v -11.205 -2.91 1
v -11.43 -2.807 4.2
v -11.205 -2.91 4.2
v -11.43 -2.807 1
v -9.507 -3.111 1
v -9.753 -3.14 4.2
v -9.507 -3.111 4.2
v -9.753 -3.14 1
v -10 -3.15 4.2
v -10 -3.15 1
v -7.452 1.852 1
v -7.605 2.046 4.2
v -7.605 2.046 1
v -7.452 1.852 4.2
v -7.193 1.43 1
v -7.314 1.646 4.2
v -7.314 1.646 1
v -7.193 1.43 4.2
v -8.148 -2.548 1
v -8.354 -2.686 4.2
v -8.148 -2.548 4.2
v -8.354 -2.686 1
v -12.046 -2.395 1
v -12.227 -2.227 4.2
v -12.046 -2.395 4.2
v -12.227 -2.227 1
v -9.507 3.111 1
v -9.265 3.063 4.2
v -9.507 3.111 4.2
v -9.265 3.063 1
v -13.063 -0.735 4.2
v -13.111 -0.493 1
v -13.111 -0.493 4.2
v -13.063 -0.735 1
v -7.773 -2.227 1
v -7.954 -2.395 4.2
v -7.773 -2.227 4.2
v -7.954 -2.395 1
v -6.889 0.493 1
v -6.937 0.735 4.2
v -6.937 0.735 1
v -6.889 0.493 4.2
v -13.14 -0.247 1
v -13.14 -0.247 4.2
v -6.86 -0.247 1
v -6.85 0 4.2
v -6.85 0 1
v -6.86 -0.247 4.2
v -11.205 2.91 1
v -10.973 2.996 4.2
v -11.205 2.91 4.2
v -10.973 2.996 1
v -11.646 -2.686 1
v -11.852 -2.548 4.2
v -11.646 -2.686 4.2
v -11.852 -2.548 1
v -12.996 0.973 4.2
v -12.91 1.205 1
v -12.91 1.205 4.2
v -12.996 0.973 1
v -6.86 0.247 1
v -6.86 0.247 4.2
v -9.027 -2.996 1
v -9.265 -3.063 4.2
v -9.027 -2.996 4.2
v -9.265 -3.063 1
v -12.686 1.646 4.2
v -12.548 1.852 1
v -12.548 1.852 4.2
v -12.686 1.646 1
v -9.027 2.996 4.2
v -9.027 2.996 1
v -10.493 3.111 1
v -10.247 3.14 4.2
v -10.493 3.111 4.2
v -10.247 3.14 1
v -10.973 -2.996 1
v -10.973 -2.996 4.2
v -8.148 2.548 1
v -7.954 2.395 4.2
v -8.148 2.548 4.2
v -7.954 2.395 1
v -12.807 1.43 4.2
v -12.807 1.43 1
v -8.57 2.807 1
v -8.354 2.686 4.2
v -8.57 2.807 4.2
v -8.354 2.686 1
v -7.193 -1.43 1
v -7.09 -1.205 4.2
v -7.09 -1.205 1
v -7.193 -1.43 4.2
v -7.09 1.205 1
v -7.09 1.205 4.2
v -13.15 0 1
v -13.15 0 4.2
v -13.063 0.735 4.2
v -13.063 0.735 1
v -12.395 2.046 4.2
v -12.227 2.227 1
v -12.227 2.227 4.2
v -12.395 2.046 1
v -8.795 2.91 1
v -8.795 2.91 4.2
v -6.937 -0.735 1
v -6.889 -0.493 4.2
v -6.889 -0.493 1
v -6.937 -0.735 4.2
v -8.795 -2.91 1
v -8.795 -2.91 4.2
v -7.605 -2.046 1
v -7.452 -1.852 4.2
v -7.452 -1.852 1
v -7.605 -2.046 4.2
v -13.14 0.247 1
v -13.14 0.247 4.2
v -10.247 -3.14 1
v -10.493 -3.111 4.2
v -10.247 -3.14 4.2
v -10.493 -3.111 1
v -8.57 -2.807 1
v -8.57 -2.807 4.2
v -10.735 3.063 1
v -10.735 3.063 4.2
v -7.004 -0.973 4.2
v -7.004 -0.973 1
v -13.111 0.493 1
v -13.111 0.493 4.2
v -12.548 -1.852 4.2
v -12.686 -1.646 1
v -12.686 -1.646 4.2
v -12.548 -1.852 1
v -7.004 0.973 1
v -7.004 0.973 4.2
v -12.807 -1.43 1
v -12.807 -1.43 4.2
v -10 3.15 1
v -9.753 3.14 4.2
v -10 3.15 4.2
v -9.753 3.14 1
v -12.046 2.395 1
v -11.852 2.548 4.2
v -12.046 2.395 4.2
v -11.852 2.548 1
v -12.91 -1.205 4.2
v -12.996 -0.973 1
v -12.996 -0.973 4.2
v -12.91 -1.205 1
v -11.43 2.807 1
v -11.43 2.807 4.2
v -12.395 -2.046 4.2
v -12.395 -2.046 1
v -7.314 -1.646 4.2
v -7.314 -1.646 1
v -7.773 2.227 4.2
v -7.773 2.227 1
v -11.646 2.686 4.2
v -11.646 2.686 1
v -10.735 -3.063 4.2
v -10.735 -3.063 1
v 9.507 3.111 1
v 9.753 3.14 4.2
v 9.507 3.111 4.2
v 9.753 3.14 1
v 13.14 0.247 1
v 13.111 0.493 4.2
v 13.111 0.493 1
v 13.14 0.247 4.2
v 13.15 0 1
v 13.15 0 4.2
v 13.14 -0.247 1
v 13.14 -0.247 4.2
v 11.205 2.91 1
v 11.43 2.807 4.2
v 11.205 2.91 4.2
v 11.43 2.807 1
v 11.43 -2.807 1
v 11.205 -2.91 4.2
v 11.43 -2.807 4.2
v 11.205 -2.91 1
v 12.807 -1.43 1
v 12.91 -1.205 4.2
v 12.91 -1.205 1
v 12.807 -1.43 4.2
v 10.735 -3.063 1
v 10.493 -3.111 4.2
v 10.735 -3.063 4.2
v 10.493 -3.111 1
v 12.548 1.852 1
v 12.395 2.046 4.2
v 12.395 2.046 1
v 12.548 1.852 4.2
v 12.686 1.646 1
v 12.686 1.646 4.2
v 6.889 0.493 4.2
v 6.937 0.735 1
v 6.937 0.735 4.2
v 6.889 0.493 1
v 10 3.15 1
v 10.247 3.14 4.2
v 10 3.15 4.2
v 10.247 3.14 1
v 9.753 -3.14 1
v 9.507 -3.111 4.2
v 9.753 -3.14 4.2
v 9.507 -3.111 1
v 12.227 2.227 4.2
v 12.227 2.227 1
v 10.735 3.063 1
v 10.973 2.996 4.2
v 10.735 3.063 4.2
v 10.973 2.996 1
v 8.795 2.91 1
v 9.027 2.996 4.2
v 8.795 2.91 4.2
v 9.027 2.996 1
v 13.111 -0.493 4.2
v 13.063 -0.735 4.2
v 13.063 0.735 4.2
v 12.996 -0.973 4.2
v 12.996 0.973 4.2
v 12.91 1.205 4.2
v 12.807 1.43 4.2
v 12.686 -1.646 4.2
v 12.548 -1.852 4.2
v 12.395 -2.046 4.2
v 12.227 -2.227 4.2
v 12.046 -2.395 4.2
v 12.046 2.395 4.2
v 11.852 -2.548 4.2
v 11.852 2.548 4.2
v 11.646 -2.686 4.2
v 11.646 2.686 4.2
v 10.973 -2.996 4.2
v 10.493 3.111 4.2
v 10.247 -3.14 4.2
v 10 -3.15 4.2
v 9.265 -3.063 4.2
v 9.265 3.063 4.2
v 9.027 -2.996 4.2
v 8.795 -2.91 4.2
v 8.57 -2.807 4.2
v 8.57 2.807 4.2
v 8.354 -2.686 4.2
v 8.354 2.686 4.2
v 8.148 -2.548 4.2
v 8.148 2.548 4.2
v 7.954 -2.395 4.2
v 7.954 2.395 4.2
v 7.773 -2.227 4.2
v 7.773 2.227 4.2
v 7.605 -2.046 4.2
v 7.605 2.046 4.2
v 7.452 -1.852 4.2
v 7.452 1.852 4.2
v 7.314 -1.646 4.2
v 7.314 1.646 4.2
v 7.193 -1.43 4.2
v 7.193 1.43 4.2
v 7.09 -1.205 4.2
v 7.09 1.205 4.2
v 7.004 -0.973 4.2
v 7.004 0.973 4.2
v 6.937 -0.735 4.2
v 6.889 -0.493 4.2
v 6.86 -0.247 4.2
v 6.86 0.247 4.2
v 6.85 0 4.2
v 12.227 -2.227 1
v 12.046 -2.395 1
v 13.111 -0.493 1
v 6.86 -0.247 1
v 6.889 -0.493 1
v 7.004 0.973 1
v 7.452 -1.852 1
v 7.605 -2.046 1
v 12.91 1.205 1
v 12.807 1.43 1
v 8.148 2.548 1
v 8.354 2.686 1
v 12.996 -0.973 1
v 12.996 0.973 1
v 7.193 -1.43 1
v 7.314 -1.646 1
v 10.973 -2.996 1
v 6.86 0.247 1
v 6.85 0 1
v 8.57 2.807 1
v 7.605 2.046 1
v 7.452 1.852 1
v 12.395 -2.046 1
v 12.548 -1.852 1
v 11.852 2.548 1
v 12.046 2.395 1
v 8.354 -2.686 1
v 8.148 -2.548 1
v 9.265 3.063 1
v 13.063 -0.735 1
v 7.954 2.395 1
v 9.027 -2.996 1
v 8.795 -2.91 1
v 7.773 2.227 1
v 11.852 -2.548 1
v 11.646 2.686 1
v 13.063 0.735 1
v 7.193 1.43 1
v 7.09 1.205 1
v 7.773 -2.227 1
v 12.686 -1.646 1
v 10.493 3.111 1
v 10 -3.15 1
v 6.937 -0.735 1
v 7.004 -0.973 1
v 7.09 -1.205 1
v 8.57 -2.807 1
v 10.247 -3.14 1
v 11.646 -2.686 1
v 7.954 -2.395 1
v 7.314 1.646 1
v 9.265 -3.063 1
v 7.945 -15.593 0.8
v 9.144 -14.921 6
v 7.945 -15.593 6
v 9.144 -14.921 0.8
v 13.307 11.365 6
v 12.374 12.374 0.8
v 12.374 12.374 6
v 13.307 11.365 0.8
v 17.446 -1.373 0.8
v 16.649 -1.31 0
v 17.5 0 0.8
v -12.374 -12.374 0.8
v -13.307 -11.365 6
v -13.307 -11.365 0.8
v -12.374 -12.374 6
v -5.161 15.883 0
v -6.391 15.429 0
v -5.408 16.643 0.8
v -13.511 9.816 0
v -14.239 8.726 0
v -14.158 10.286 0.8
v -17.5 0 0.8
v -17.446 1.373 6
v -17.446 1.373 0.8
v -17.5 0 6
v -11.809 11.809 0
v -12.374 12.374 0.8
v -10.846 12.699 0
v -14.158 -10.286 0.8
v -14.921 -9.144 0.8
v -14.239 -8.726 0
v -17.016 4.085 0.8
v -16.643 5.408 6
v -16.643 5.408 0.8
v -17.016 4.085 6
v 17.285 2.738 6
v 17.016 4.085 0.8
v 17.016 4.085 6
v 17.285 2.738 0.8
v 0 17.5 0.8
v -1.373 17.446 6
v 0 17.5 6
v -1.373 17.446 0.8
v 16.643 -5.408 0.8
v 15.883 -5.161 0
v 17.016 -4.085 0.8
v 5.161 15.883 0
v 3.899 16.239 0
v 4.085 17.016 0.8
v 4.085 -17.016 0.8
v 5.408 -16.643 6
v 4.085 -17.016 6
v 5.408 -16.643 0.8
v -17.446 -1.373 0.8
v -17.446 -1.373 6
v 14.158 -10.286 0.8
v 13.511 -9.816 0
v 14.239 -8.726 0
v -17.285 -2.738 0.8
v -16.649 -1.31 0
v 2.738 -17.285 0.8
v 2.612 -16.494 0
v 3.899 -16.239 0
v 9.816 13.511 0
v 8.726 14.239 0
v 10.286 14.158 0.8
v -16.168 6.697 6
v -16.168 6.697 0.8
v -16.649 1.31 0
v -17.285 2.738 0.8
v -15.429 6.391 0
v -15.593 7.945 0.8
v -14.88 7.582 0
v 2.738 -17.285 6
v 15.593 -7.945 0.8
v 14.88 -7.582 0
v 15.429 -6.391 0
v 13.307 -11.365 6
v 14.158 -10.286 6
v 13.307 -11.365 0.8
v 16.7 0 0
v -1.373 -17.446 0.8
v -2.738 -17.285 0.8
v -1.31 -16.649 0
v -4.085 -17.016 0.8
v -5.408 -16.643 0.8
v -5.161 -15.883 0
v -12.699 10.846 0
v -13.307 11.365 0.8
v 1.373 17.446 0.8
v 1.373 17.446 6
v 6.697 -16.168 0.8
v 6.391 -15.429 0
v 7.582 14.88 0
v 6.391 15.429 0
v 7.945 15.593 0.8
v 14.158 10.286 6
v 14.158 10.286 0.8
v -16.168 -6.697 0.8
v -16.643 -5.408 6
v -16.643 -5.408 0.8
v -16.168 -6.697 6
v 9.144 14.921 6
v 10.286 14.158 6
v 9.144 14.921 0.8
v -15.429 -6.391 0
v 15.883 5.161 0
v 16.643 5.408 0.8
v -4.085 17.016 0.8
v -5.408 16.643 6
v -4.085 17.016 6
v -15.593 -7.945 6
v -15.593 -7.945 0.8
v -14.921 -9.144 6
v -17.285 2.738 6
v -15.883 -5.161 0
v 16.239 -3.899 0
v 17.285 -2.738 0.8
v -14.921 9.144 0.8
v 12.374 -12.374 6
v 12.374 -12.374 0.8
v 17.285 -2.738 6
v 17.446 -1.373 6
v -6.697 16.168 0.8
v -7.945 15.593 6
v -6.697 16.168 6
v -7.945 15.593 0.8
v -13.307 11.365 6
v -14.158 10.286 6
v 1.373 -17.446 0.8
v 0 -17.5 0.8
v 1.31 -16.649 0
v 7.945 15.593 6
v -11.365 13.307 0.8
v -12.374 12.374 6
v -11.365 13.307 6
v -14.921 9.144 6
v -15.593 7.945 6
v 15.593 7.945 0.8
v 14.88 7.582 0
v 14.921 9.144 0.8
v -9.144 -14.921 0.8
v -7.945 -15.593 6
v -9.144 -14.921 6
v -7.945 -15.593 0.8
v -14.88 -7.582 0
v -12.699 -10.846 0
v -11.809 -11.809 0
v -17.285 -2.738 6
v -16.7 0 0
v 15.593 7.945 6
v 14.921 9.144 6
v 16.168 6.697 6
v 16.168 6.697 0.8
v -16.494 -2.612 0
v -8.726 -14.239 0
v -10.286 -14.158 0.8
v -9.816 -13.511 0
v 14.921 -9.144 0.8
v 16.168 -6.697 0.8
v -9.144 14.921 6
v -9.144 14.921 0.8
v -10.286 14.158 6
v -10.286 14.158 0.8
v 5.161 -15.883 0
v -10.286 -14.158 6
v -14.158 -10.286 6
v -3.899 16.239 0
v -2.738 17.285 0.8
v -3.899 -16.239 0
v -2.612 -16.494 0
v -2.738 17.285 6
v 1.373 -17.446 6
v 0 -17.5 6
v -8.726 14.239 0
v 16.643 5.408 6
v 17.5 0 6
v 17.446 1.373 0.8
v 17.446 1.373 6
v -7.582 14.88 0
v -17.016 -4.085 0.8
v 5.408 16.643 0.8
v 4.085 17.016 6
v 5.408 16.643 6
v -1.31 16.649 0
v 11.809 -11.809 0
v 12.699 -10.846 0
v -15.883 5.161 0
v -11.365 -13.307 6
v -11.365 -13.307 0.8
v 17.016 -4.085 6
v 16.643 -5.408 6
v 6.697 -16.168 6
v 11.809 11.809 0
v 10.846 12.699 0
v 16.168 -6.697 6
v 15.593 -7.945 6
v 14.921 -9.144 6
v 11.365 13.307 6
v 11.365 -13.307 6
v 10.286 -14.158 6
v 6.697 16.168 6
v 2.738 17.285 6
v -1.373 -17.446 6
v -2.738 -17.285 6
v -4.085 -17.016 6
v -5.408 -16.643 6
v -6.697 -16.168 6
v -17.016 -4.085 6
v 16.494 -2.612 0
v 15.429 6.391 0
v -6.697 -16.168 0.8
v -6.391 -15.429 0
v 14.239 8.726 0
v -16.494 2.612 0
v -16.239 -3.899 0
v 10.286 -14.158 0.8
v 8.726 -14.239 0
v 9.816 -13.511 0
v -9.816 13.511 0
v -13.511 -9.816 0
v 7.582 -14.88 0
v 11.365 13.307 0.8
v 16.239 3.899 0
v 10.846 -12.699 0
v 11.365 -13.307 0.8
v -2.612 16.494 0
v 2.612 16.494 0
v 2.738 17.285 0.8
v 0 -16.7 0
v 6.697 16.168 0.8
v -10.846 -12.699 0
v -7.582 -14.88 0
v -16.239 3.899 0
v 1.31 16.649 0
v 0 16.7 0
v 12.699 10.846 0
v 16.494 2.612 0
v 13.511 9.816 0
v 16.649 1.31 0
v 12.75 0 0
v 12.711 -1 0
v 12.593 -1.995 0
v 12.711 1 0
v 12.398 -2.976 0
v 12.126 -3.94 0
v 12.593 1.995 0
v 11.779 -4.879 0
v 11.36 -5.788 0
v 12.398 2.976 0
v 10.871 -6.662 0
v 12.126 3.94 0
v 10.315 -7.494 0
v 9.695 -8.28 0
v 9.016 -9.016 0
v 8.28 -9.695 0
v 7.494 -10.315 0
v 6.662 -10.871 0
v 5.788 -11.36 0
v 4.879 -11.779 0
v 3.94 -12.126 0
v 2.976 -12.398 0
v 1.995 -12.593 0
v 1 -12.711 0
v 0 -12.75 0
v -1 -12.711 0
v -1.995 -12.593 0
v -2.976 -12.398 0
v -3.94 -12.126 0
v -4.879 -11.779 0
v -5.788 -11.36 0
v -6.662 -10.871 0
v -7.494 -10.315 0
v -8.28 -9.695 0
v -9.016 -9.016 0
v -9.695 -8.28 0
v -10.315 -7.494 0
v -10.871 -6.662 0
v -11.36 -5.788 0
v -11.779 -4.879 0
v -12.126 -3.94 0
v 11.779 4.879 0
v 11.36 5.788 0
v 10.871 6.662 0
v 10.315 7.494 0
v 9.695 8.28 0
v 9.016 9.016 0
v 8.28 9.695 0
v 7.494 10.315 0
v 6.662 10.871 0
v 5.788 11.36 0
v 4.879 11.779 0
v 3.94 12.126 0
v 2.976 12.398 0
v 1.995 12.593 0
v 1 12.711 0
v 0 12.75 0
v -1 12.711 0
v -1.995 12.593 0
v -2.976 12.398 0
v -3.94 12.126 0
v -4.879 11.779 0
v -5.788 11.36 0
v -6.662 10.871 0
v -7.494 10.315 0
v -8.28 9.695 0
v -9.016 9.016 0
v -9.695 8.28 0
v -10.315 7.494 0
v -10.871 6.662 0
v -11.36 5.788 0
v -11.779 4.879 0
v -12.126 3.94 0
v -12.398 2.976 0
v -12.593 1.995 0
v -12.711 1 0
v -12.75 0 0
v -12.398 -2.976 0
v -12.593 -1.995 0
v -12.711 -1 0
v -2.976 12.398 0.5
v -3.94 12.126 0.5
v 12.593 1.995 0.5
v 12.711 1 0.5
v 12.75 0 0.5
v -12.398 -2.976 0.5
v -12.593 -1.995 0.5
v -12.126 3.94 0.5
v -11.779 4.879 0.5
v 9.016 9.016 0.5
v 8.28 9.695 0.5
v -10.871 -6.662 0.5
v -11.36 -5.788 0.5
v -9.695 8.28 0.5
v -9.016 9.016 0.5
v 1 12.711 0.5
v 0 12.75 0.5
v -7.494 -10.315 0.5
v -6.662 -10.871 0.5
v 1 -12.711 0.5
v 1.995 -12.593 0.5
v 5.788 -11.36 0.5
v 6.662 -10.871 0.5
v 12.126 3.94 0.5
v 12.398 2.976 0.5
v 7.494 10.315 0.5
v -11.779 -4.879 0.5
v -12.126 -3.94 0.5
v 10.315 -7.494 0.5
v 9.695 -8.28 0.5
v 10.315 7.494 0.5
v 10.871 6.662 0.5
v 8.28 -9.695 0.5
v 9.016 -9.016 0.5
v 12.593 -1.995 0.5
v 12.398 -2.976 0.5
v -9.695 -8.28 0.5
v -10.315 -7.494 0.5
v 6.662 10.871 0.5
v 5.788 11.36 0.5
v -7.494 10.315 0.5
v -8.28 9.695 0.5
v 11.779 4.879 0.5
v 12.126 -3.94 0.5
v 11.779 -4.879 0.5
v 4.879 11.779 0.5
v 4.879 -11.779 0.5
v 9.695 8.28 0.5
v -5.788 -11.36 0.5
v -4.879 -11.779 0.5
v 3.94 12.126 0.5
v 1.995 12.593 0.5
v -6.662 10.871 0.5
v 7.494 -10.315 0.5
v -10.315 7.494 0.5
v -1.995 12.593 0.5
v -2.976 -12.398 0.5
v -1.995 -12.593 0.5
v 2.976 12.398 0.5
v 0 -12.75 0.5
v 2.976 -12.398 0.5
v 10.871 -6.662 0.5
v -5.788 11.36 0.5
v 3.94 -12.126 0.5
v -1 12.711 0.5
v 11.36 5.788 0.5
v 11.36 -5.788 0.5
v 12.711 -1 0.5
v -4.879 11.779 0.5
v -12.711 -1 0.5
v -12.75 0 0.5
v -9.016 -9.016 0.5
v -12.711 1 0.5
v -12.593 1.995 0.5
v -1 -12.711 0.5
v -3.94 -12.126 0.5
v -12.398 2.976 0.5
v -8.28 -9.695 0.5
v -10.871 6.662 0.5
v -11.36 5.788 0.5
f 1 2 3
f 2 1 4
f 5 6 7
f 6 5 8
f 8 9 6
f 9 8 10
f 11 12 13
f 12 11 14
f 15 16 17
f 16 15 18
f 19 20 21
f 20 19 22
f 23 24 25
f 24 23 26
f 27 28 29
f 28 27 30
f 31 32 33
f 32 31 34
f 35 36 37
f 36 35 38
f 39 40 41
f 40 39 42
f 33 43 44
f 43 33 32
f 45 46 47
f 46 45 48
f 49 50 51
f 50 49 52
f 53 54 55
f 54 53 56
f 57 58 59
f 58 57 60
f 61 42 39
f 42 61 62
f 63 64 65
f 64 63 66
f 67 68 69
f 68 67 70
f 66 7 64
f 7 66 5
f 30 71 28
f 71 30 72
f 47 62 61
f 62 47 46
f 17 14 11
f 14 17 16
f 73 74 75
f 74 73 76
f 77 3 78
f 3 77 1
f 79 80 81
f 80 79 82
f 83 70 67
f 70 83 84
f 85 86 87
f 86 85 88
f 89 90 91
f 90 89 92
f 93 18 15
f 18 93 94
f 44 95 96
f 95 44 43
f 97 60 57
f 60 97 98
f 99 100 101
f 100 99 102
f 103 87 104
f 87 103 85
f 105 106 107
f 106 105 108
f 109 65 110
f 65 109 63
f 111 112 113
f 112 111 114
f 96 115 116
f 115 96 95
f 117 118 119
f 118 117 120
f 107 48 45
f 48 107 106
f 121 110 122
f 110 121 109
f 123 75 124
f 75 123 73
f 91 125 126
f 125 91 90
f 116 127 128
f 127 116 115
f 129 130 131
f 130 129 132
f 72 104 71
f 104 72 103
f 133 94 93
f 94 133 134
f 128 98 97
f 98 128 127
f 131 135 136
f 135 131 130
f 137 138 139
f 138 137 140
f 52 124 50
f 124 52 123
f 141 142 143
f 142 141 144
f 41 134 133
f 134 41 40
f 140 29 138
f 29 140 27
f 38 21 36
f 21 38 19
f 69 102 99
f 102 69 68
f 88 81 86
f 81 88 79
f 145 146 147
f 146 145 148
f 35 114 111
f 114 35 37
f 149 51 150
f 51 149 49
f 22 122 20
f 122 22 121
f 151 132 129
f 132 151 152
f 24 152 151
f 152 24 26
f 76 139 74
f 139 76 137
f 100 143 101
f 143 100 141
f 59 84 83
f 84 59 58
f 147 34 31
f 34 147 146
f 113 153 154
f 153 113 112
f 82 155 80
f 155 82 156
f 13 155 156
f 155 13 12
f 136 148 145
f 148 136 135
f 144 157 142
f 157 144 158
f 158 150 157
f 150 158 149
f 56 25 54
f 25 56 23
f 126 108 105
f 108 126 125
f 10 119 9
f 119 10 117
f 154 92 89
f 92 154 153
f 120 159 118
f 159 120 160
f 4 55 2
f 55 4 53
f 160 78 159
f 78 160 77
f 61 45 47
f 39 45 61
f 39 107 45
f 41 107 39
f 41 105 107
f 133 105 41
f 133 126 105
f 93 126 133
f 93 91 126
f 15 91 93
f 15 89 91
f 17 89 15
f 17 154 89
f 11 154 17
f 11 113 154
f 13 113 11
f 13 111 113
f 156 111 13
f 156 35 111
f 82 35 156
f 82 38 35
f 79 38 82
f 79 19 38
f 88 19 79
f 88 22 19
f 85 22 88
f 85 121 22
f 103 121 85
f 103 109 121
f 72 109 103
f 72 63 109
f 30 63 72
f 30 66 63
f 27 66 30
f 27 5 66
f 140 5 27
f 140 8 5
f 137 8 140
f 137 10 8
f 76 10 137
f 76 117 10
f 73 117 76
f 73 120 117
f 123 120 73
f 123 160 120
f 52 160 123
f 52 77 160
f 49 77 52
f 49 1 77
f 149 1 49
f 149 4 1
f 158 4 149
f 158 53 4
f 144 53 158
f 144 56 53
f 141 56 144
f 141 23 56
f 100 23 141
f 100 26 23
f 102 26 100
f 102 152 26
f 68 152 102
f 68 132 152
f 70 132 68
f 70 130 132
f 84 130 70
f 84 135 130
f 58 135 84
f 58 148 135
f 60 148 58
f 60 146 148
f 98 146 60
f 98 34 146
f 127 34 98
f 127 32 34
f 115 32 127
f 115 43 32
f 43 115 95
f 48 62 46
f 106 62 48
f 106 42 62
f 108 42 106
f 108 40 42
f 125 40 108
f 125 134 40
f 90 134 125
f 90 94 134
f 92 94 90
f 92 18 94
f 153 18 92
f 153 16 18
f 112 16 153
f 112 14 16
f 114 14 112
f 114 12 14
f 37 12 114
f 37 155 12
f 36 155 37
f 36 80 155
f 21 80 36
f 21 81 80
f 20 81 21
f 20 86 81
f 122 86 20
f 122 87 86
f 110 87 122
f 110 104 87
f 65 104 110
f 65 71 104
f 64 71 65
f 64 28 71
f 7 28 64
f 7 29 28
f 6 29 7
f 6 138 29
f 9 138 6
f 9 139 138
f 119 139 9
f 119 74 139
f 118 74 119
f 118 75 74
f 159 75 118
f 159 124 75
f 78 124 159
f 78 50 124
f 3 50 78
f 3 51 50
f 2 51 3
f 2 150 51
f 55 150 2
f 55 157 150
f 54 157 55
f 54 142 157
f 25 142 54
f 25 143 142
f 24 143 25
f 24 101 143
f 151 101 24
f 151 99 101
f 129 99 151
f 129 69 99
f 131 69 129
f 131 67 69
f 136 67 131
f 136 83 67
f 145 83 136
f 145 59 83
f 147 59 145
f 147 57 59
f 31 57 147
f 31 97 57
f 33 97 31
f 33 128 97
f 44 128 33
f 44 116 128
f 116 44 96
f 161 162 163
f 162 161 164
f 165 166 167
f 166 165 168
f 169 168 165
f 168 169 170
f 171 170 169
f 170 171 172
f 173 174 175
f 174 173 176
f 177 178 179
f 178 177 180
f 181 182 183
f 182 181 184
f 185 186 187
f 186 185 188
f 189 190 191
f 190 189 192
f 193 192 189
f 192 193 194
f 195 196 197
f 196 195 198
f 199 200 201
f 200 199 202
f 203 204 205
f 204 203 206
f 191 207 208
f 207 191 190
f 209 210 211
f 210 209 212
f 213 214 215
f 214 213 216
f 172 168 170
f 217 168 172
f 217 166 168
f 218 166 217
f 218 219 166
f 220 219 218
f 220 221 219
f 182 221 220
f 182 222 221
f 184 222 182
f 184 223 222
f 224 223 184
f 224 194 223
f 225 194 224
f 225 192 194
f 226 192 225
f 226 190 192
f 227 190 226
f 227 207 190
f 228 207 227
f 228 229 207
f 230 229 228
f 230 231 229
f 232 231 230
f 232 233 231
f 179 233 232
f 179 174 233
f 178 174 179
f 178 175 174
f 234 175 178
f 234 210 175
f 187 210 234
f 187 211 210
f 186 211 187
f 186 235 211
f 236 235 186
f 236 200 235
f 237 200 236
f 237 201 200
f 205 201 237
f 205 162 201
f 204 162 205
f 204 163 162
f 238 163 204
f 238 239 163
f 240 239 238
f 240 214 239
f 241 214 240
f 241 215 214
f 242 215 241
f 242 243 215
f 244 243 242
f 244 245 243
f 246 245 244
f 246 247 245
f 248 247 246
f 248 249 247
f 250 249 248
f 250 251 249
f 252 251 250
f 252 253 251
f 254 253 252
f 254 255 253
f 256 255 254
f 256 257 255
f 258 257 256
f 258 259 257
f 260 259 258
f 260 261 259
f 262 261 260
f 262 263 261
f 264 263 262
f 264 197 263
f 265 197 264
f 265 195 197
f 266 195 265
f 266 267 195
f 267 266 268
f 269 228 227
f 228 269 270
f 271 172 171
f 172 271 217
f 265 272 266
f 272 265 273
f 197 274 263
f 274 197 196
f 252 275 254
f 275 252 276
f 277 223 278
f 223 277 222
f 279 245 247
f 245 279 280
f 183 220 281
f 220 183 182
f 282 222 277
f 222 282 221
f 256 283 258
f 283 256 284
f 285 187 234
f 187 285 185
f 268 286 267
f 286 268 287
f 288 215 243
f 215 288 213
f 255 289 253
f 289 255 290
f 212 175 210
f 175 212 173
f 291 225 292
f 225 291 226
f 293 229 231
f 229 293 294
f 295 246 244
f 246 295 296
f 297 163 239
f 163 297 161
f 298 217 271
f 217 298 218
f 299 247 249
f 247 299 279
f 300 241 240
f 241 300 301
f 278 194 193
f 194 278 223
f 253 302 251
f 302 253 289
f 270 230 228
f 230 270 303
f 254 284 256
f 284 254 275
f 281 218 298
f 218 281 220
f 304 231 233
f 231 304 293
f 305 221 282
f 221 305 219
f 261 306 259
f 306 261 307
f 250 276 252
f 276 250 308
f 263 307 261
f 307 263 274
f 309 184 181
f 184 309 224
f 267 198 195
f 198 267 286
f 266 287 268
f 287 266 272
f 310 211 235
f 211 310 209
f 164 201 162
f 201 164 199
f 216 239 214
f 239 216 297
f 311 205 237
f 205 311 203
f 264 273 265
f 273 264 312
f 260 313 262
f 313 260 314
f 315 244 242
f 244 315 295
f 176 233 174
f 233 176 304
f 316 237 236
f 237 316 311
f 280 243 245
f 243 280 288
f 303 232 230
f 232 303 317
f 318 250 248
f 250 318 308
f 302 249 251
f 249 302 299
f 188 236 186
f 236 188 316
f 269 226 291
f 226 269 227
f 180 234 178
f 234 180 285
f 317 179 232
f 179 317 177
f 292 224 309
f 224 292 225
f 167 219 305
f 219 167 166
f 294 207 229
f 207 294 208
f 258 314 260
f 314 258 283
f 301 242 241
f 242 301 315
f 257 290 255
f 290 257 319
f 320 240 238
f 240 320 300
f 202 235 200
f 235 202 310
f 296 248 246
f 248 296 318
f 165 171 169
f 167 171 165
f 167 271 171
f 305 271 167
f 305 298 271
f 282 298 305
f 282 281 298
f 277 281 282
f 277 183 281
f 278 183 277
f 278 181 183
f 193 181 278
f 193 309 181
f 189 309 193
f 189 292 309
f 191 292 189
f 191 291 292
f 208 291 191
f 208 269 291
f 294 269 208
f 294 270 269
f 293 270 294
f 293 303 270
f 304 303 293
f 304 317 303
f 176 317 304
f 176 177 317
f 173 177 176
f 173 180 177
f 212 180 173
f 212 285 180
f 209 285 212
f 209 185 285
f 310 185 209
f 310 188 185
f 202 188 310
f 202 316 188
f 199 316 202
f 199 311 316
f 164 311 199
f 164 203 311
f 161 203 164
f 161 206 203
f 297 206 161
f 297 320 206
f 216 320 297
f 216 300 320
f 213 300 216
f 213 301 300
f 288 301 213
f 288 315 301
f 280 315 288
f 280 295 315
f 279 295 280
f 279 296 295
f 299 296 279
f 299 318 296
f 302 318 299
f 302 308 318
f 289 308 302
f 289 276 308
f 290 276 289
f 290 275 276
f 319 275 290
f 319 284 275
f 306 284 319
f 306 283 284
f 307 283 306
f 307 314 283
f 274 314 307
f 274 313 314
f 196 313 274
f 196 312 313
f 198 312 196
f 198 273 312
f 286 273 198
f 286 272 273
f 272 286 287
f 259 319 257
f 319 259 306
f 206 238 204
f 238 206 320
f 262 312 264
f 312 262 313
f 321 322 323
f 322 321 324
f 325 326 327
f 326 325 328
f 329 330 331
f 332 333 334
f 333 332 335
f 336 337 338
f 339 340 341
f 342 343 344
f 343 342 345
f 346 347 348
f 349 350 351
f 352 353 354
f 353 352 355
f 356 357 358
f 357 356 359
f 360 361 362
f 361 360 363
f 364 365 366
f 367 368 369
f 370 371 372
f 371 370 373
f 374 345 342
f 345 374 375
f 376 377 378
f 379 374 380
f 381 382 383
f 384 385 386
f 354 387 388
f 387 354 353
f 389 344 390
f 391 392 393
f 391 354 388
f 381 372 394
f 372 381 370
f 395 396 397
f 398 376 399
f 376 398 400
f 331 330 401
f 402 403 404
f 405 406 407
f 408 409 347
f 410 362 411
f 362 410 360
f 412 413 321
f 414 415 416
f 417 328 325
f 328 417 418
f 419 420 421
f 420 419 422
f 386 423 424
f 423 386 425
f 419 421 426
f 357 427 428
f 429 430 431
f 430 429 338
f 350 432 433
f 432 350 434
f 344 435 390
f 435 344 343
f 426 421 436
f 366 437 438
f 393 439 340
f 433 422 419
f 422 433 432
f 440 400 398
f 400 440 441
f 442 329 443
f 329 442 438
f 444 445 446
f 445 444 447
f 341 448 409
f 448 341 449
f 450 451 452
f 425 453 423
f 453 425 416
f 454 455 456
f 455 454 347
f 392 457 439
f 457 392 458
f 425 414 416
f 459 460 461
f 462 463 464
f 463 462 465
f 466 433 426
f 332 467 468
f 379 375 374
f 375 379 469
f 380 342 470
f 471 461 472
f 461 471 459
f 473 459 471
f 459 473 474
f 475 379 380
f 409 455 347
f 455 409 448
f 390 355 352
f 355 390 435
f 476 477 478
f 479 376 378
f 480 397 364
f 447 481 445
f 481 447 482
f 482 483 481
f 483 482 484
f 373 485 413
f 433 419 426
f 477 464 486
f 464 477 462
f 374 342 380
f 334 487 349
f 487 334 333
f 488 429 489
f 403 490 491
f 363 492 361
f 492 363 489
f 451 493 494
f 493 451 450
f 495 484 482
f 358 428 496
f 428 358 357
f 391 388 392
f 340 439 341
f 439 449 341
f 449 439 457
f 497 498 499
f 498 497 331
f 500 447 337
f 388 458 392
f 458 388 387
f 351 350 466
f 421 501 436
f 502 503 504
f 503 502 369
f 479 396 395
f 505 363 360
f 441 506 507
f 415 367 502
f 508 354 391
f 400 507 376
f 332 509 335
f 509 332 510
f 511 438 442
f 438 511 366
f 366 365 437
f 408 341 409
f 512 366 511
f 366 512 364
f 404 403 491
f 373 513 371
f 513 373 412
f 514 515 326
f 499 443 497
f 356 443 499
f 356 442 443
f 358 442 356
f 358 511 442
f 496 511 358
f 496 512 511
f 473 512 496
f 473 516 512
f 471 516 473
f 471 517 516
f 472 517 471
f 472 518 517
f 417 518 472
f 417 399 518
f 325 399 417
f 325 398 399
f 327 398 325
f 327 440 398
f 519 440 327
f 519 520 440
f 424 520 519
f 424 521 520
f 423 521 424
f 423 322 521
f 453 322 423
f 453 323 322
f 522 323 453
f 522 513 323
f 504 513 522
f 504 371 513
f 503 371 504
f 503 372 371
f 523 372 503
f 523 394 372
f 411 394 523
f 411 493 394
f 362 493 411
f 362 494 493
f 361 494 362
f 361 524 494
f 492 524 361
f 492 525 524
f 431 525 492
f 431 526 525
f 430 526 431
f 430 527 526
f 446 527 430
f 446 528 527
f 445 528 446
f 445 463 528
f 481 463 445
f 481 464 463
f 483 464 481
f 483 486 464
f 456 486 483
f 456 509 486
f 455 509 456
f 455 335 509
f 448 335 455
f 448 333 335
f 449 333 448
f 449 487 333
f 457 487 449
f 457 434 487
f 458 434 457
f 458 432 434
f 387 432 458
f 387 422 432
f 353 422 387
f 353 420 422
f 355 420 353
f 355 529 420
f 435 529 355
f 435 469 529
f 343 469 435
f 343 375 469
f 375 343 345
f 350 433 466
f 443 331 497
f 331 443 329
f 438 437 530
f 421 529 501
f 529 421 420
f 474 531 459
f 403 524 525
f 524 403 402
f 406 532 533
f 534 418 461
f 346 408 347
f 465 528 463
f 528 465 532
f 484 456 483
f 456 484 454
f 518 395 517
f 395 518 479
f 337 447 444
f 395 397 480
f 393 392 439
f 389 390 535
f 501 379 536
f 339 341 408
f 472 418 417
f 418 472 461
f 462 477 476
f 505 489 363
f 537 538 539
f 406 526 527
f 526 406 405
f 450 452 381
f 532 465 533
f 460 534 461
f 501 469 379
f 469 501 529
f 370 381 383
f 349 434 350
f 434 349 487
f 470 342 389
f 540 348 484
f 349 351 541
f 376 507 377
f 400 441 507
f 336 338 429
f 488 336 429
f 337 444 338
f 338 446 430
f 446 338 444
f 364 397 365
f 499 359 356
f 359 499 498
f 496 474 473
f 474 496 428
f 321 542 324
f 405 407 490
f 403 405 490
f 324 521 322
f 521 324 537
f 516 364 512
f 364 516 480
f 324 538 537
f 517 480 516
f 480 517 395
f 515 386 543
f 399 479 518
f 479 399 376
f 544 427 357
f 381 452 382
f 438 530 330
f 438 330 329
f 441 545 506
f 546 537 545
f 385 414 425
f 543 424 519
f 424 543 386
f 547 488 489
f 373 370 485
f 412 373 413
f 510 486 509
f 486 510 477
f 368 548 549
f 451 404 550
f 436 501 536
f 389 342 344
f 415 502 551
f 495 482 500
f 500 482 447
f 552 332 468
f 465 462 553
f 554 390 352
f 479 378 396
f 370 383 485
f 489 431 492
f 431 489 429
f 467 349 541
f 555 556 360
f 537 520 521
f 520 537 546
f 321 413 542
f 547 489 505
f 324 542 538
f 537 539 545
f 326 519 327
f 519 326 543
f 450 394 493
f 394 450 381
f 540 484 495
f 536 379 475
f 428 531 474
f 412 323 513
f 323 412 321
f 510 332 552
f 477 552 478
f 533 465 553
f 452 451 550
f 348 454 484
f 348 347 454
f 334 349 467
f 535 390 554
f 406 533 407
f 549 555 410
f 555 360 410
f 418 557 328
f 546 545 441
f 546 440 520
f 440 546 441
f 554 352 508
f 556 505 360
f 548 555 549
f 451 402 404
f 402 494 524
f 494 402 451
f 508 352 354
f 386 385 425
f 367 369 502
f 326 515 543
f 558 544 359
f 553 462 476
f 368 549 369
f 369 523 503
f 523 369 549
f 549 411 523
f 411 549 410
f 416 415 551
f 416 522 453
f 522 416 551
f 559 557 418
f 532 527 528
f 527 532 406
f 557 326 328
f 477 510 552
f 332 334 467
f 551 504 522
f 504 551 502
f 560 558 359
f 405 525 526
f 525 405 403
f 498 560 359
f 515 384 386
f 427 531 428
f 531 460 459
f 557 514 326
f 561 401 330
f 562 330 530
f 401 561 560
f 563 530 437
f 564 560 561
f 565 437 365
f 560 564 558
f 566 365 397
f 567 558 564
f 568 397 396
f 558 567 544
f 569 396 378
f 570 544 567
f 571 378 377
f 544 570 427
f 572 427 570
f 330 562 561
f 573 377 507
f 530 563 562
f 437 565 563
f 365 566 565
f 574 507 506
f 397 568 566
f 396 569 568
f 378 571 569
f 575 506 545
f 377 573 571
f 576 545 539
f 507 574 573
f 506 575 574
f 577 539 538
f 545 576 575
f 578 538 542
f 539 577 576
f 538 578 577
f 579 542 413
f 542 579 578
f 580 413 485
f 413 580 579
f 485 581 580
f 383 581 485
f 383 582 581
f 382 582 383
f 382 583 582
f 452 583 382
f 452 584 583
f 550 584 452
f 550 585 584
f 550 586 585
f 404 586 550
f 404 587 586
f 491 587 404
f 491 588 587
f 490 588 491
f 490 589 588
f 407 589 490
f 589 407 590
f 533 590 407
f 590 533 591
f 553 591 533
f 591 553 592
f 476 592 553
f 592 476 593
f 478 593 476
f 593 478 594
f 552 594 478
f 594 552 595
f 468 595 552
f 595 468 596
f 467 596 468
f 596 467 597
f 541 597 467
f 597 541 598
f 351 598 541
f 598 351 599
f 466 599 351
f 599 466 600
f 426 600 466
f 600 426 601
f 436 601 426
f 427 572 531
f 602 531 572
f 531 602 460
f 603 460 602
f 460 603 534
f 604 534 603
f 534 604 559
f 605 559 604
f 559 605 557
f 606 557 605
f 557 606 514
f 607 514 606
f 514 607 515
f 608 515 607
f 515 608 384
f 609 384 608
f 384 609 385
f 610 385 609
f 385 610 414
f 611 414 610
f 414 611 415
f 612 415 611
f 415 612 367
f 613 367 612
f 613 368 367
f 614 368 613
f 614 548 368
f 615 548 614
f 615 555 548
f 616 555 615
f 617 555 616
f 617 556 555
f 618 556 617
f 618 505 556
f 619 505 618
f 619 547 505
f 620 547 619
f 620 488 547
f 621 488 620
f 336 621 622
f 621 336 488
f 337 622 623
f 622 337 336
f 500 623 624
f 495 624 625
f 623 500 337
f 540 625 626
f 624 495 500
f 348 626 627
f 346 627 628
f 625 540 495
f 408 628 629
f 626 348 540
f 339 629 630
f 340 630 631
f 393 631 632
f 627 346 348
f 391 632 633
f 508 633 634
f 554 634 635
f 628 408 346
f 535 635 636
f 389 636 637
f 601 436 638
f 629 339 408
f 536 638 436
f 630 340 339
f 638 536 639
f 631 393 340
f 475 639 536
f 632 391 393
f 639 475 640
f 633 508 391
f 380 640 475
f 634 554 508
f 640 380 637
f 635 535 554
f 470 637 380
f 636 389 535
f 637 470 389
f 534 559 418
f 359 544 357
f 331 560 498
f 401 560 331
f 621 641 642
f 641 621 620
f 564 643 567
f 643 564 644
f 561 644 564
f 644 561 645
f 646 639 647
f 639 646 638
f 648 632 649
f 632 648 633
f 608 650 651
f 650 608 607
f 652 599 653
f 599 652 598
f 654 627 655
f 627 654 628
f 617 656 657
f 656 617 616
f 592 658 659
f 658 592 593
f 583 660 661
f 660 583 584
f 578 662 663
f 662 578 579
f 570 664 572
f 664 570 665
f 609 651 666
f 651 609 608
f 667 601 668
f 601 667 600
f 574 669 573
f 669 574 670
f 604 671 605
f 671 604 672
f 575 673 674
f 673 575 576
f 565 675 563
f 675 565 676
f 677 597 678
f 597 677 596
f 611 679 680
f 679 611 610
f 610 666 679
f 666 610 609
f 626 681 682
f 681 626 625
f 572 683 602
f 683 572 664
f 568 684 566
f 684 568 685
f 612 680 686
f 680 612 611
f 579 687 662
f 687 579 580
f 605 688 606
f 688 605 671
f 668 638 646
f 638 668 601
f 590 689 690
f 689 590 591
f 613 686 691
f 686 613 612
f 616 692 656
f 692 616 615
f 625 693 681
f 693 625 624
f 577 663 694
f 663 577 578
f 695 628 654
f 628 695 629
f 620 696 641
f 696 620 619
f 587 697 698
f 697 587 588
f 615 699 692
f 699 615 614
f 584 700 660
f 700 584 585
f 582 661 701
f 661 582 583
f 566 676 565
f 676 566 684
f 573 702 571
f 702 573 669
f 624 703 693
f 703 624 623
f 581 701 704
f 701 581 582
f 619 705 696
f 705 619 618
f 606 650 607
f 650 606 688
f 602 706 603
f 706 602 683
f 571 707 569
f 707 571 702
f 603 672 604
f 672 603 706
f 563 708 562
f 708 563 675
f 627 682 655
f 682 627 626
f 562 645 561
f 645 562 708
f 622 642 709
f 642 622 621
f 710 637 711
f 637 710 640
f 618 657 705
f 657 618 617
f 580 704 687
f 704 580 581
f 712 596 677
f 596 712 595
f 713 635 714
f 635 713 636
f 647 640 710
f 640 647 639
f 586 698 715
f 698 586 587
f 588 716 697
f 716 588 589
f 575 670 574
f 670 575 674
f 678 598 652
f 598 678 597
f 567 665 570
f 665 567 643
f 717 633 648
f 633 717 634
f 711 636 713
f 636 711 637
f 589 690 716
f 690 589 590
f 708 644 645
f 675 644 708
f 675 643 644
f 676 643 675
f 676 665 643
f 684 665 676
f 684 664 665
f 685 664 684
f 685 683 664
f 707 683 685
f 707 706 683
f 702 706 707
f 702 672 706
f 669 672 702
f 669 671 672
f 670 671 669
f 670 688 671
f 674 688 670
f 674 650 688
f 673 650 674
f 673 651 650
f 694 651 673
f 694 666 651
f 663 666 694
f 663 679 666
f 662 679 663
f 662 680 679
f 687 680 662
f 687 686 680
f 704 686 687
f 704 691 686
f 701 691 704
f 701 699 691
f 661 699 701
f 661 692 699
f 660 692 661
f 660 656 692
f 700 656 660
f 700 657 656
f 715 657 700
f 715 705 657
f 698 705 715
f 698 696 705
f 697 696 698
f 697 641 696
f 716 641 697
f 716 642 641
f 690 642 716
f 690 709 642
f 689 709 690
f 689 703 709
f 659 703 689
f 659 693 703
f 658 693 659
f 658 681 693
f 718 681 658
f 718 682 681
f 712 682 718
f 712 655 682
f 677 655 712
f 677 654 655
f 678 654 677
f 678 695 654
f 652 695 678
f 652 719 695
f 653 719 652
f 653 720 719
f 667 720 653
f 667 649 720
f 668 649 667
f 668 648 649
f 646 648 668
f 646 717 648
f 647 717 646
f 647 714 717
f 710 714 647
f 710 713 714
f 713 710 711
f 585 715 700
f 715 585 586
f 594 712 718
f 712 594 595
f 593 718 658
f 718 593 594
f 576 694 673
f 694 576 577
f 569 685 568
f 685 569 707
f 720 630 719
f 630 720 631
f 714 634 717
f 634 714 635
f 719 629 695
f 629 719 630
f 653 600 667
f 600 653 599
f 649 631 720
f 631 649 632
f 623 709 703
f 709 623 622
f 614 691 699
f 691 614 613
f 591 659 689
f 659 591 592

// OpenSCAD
// file: ../common-params.scad
// common-params.scad — Shared dimensions for BabyBox enclosure + figurines
// All values in millimeters

// === Neodymium Magnets (6x3mm disc) ===
magnet_dia       = 6;      // nominal diameter
magnet_h         = 3;      // nominal height
magnet_pocket_dia = 6.3;   // pocket diameter (0.3mm clearance for drop-in)
magnet_pocket_h  = 3.2;    // cavity height (0.2mm extra so magnet sits below rim)
magnet_spacing   = 20;     // center-to-center distance between the two magnets
magnet_seal_h    = 1.0;    // solid wall thickness enclosing magnets on each side
                            // (pause print, insert magnets, resume to seal)

// === RFID Sticker Tag (25mm coin, MIFARE 13.56 MHz) ===
rfid_tag_dia     = 25;     // nominal diameter
rfid_tag_h       = 0.3;    // sticker thickness (very thin)
rfid_recess_dia  = 25.5;   // recess diameter (0.5mm tolerance)
rfid_recess_h    = 0.5;    // recess depth

// === MFRC522 RFID Module ===
mfrc522_l        = 60;     // board length
mfrc522_w        = 40;     // board width
mfrc522_h        = 4;      // PCB thickness (without header)
mfrc522_h_header = 8;      // total height with header pins
mfrc522_hole_dia = 2;      // mounting hole diameter (M2)
mfrc522_hole_x   = 56;     // mounting hole X spacing
mfrc522_hole_y   = 36;     // mounting hole Y spacing
mfrc522_hole_margin_x = 2; // hole inset from board edge X
mfrc522_hole_margin_y = 2; // hole inset from board edge Y

// === Print Tolerances ===
tol              = 0.3;    // general clearance tolerance
press_tol        = 0.15;   // press-fit tolerance (tighter)
wall_min         = 1.2;    // minimum printable wall thickness (3 perimeters at 0.4mm)

// === Screw Dimensions ===
m2_hole_dia      = 2.2;    // M2 clearance hole
m2_tap_dia       = 1.6;    // M2 self-tap hole in plastic
m25_hole_dia     = 2.7;    // M2.5 clearance hole
m25_tap_dia      = 2.0;    // M2.5 self-tap hole in plastic
m3_hole_dia      = 3.2;    // M3 clearance hole
m3_tap_dia       = 2.5;    // M3 self-tap hole in plastic
// main file
// base-template.scad — Parametric figurine base for BabyBox
// All figurines share this base; the decorative top is merged separately.
//
// HIDDEN MAGNETS: Magnets are fully enclosed inside the base.
//   1. Print this part right-side up (flat bottom on bed)
//   2. Pause at Z = magnet_seal_h + magnet_pocket_h (see echo output)
//   3. Drop 2x neodymium magnets into the open cavities
//   4. Resume print — ceiling layers seal the magnets inside
//
// Usage: Open in OpenSCAD, set render_part below, then F5 (preview) or F6 (render).

use <../common-params.scad>
include <../common-params.scad>

// === Render selector ===
// "base"        — printable base only
// "cross"       — cross-section for inspection
// "demo"        — base with a sample figurine body on top
render_part = "base";  // change this to switch views

// === Base Parameters ===
base_dia      = 35;    // outer diameter
base_h        = 6;     // total height (floor + magnet + ceiling + margin)
chamfer       = 0.8;   // bottom edge chamfer

// Derived: pause height for magnet insertion
magnet_pause_z = magnet_seal_h + magnet_pocket_h;
magnet_ceiling = base_h - magnet_pause_z;

// === Figurine Demo ===
demo_body_dia = 20;    // sample body diameter
demo_body_h   = 30;    // sample body height

$fn = 80;  // circle smoothness

// Print the pause height to the console
echo(str(">>> FIGURINE BASE: Pause print at Z = ", magnet_pause_z, " mm to insert magnets"));
echo(str("    Floor below magnets: ", magnet_seal_h, " mm"));
echo(str("    Magnet cavity: ", magnet_pocket_h, " mm"));
echo(str("    Ceiling above magnets: ", magnet_ceiling, " mm"));

// ──────────────────────────────────────────
// Modules
// ──────────────────────────────────────────

module base_body() {
    // Cylinder with chamfered bottom edge via rotate_extrude of a 2D profile
    r = base_dia / 2;
    rotate_extrude()
        polygon([
            [0, 0],
            [r - chamfer, 0],     // bottom edge, inset by chamfer
            [r, chamfer],          // outer wall starts after chamfer
            [r, base_h],           // top outer edge
            [0, base_h],           // top center
        ]);
}

module magnet_pockets() {
    // Two enclosed magnet cavities inside the base.
    // Floor: Z = 0 to magnet_seal_h (solid, printed first)
    // Cavity: Z = magnet_seal_h to magnet_seal_h + magnet_pocket_h (hollow)
    // Ceiling: Z = magnet_pause_z to base_h (solid, printed after pause)
    for (x = [-magnet_spacing/2, magnet_spacing/2]) {
        translate([x, 0, magnet_seal_h])
            cylinder(d = magnet_pocket_dia, h = magnet_pocket_h);
    }
}

module rfid_recess() {
    // Shallow recess on the bottom face for the RFID coin sticker
    translate([0, 0, -0.01])
        cylinder(d = rfid_recess_dia, h = rfid_recess_h + 0.01);
}

module figurine_base() {
    difference() {
        base_body();
        magnet_pockets();
        rfid_recess();
    }
}

module cross_section() {
    // Half-cut view for inspecting pocket depths and wall thicknesses
    difference() {
        figurine_base();
        translate([0, -base_dia, -1])
            cube([base_dia, base_dia * 2, base_h + 2]);
    }
}

module demo() {
    // Base + sample cylindrical body to visualize a complete figurine
    figurine_base();
    translate([0, 0, base_h])
        cylinder(d1 = demo_body_dia, d2 = demo_body_dia * 0.7, h = demo_body_h);
}

// ──────────────────────────────────────────
// Render
// ──────────────────────────────────────────

if (render_part == "base") {
    figurine_base();
} else if (render_part == "cross") {
    cross_section();
} else if (render_part == "demo") {
    demo();
}
